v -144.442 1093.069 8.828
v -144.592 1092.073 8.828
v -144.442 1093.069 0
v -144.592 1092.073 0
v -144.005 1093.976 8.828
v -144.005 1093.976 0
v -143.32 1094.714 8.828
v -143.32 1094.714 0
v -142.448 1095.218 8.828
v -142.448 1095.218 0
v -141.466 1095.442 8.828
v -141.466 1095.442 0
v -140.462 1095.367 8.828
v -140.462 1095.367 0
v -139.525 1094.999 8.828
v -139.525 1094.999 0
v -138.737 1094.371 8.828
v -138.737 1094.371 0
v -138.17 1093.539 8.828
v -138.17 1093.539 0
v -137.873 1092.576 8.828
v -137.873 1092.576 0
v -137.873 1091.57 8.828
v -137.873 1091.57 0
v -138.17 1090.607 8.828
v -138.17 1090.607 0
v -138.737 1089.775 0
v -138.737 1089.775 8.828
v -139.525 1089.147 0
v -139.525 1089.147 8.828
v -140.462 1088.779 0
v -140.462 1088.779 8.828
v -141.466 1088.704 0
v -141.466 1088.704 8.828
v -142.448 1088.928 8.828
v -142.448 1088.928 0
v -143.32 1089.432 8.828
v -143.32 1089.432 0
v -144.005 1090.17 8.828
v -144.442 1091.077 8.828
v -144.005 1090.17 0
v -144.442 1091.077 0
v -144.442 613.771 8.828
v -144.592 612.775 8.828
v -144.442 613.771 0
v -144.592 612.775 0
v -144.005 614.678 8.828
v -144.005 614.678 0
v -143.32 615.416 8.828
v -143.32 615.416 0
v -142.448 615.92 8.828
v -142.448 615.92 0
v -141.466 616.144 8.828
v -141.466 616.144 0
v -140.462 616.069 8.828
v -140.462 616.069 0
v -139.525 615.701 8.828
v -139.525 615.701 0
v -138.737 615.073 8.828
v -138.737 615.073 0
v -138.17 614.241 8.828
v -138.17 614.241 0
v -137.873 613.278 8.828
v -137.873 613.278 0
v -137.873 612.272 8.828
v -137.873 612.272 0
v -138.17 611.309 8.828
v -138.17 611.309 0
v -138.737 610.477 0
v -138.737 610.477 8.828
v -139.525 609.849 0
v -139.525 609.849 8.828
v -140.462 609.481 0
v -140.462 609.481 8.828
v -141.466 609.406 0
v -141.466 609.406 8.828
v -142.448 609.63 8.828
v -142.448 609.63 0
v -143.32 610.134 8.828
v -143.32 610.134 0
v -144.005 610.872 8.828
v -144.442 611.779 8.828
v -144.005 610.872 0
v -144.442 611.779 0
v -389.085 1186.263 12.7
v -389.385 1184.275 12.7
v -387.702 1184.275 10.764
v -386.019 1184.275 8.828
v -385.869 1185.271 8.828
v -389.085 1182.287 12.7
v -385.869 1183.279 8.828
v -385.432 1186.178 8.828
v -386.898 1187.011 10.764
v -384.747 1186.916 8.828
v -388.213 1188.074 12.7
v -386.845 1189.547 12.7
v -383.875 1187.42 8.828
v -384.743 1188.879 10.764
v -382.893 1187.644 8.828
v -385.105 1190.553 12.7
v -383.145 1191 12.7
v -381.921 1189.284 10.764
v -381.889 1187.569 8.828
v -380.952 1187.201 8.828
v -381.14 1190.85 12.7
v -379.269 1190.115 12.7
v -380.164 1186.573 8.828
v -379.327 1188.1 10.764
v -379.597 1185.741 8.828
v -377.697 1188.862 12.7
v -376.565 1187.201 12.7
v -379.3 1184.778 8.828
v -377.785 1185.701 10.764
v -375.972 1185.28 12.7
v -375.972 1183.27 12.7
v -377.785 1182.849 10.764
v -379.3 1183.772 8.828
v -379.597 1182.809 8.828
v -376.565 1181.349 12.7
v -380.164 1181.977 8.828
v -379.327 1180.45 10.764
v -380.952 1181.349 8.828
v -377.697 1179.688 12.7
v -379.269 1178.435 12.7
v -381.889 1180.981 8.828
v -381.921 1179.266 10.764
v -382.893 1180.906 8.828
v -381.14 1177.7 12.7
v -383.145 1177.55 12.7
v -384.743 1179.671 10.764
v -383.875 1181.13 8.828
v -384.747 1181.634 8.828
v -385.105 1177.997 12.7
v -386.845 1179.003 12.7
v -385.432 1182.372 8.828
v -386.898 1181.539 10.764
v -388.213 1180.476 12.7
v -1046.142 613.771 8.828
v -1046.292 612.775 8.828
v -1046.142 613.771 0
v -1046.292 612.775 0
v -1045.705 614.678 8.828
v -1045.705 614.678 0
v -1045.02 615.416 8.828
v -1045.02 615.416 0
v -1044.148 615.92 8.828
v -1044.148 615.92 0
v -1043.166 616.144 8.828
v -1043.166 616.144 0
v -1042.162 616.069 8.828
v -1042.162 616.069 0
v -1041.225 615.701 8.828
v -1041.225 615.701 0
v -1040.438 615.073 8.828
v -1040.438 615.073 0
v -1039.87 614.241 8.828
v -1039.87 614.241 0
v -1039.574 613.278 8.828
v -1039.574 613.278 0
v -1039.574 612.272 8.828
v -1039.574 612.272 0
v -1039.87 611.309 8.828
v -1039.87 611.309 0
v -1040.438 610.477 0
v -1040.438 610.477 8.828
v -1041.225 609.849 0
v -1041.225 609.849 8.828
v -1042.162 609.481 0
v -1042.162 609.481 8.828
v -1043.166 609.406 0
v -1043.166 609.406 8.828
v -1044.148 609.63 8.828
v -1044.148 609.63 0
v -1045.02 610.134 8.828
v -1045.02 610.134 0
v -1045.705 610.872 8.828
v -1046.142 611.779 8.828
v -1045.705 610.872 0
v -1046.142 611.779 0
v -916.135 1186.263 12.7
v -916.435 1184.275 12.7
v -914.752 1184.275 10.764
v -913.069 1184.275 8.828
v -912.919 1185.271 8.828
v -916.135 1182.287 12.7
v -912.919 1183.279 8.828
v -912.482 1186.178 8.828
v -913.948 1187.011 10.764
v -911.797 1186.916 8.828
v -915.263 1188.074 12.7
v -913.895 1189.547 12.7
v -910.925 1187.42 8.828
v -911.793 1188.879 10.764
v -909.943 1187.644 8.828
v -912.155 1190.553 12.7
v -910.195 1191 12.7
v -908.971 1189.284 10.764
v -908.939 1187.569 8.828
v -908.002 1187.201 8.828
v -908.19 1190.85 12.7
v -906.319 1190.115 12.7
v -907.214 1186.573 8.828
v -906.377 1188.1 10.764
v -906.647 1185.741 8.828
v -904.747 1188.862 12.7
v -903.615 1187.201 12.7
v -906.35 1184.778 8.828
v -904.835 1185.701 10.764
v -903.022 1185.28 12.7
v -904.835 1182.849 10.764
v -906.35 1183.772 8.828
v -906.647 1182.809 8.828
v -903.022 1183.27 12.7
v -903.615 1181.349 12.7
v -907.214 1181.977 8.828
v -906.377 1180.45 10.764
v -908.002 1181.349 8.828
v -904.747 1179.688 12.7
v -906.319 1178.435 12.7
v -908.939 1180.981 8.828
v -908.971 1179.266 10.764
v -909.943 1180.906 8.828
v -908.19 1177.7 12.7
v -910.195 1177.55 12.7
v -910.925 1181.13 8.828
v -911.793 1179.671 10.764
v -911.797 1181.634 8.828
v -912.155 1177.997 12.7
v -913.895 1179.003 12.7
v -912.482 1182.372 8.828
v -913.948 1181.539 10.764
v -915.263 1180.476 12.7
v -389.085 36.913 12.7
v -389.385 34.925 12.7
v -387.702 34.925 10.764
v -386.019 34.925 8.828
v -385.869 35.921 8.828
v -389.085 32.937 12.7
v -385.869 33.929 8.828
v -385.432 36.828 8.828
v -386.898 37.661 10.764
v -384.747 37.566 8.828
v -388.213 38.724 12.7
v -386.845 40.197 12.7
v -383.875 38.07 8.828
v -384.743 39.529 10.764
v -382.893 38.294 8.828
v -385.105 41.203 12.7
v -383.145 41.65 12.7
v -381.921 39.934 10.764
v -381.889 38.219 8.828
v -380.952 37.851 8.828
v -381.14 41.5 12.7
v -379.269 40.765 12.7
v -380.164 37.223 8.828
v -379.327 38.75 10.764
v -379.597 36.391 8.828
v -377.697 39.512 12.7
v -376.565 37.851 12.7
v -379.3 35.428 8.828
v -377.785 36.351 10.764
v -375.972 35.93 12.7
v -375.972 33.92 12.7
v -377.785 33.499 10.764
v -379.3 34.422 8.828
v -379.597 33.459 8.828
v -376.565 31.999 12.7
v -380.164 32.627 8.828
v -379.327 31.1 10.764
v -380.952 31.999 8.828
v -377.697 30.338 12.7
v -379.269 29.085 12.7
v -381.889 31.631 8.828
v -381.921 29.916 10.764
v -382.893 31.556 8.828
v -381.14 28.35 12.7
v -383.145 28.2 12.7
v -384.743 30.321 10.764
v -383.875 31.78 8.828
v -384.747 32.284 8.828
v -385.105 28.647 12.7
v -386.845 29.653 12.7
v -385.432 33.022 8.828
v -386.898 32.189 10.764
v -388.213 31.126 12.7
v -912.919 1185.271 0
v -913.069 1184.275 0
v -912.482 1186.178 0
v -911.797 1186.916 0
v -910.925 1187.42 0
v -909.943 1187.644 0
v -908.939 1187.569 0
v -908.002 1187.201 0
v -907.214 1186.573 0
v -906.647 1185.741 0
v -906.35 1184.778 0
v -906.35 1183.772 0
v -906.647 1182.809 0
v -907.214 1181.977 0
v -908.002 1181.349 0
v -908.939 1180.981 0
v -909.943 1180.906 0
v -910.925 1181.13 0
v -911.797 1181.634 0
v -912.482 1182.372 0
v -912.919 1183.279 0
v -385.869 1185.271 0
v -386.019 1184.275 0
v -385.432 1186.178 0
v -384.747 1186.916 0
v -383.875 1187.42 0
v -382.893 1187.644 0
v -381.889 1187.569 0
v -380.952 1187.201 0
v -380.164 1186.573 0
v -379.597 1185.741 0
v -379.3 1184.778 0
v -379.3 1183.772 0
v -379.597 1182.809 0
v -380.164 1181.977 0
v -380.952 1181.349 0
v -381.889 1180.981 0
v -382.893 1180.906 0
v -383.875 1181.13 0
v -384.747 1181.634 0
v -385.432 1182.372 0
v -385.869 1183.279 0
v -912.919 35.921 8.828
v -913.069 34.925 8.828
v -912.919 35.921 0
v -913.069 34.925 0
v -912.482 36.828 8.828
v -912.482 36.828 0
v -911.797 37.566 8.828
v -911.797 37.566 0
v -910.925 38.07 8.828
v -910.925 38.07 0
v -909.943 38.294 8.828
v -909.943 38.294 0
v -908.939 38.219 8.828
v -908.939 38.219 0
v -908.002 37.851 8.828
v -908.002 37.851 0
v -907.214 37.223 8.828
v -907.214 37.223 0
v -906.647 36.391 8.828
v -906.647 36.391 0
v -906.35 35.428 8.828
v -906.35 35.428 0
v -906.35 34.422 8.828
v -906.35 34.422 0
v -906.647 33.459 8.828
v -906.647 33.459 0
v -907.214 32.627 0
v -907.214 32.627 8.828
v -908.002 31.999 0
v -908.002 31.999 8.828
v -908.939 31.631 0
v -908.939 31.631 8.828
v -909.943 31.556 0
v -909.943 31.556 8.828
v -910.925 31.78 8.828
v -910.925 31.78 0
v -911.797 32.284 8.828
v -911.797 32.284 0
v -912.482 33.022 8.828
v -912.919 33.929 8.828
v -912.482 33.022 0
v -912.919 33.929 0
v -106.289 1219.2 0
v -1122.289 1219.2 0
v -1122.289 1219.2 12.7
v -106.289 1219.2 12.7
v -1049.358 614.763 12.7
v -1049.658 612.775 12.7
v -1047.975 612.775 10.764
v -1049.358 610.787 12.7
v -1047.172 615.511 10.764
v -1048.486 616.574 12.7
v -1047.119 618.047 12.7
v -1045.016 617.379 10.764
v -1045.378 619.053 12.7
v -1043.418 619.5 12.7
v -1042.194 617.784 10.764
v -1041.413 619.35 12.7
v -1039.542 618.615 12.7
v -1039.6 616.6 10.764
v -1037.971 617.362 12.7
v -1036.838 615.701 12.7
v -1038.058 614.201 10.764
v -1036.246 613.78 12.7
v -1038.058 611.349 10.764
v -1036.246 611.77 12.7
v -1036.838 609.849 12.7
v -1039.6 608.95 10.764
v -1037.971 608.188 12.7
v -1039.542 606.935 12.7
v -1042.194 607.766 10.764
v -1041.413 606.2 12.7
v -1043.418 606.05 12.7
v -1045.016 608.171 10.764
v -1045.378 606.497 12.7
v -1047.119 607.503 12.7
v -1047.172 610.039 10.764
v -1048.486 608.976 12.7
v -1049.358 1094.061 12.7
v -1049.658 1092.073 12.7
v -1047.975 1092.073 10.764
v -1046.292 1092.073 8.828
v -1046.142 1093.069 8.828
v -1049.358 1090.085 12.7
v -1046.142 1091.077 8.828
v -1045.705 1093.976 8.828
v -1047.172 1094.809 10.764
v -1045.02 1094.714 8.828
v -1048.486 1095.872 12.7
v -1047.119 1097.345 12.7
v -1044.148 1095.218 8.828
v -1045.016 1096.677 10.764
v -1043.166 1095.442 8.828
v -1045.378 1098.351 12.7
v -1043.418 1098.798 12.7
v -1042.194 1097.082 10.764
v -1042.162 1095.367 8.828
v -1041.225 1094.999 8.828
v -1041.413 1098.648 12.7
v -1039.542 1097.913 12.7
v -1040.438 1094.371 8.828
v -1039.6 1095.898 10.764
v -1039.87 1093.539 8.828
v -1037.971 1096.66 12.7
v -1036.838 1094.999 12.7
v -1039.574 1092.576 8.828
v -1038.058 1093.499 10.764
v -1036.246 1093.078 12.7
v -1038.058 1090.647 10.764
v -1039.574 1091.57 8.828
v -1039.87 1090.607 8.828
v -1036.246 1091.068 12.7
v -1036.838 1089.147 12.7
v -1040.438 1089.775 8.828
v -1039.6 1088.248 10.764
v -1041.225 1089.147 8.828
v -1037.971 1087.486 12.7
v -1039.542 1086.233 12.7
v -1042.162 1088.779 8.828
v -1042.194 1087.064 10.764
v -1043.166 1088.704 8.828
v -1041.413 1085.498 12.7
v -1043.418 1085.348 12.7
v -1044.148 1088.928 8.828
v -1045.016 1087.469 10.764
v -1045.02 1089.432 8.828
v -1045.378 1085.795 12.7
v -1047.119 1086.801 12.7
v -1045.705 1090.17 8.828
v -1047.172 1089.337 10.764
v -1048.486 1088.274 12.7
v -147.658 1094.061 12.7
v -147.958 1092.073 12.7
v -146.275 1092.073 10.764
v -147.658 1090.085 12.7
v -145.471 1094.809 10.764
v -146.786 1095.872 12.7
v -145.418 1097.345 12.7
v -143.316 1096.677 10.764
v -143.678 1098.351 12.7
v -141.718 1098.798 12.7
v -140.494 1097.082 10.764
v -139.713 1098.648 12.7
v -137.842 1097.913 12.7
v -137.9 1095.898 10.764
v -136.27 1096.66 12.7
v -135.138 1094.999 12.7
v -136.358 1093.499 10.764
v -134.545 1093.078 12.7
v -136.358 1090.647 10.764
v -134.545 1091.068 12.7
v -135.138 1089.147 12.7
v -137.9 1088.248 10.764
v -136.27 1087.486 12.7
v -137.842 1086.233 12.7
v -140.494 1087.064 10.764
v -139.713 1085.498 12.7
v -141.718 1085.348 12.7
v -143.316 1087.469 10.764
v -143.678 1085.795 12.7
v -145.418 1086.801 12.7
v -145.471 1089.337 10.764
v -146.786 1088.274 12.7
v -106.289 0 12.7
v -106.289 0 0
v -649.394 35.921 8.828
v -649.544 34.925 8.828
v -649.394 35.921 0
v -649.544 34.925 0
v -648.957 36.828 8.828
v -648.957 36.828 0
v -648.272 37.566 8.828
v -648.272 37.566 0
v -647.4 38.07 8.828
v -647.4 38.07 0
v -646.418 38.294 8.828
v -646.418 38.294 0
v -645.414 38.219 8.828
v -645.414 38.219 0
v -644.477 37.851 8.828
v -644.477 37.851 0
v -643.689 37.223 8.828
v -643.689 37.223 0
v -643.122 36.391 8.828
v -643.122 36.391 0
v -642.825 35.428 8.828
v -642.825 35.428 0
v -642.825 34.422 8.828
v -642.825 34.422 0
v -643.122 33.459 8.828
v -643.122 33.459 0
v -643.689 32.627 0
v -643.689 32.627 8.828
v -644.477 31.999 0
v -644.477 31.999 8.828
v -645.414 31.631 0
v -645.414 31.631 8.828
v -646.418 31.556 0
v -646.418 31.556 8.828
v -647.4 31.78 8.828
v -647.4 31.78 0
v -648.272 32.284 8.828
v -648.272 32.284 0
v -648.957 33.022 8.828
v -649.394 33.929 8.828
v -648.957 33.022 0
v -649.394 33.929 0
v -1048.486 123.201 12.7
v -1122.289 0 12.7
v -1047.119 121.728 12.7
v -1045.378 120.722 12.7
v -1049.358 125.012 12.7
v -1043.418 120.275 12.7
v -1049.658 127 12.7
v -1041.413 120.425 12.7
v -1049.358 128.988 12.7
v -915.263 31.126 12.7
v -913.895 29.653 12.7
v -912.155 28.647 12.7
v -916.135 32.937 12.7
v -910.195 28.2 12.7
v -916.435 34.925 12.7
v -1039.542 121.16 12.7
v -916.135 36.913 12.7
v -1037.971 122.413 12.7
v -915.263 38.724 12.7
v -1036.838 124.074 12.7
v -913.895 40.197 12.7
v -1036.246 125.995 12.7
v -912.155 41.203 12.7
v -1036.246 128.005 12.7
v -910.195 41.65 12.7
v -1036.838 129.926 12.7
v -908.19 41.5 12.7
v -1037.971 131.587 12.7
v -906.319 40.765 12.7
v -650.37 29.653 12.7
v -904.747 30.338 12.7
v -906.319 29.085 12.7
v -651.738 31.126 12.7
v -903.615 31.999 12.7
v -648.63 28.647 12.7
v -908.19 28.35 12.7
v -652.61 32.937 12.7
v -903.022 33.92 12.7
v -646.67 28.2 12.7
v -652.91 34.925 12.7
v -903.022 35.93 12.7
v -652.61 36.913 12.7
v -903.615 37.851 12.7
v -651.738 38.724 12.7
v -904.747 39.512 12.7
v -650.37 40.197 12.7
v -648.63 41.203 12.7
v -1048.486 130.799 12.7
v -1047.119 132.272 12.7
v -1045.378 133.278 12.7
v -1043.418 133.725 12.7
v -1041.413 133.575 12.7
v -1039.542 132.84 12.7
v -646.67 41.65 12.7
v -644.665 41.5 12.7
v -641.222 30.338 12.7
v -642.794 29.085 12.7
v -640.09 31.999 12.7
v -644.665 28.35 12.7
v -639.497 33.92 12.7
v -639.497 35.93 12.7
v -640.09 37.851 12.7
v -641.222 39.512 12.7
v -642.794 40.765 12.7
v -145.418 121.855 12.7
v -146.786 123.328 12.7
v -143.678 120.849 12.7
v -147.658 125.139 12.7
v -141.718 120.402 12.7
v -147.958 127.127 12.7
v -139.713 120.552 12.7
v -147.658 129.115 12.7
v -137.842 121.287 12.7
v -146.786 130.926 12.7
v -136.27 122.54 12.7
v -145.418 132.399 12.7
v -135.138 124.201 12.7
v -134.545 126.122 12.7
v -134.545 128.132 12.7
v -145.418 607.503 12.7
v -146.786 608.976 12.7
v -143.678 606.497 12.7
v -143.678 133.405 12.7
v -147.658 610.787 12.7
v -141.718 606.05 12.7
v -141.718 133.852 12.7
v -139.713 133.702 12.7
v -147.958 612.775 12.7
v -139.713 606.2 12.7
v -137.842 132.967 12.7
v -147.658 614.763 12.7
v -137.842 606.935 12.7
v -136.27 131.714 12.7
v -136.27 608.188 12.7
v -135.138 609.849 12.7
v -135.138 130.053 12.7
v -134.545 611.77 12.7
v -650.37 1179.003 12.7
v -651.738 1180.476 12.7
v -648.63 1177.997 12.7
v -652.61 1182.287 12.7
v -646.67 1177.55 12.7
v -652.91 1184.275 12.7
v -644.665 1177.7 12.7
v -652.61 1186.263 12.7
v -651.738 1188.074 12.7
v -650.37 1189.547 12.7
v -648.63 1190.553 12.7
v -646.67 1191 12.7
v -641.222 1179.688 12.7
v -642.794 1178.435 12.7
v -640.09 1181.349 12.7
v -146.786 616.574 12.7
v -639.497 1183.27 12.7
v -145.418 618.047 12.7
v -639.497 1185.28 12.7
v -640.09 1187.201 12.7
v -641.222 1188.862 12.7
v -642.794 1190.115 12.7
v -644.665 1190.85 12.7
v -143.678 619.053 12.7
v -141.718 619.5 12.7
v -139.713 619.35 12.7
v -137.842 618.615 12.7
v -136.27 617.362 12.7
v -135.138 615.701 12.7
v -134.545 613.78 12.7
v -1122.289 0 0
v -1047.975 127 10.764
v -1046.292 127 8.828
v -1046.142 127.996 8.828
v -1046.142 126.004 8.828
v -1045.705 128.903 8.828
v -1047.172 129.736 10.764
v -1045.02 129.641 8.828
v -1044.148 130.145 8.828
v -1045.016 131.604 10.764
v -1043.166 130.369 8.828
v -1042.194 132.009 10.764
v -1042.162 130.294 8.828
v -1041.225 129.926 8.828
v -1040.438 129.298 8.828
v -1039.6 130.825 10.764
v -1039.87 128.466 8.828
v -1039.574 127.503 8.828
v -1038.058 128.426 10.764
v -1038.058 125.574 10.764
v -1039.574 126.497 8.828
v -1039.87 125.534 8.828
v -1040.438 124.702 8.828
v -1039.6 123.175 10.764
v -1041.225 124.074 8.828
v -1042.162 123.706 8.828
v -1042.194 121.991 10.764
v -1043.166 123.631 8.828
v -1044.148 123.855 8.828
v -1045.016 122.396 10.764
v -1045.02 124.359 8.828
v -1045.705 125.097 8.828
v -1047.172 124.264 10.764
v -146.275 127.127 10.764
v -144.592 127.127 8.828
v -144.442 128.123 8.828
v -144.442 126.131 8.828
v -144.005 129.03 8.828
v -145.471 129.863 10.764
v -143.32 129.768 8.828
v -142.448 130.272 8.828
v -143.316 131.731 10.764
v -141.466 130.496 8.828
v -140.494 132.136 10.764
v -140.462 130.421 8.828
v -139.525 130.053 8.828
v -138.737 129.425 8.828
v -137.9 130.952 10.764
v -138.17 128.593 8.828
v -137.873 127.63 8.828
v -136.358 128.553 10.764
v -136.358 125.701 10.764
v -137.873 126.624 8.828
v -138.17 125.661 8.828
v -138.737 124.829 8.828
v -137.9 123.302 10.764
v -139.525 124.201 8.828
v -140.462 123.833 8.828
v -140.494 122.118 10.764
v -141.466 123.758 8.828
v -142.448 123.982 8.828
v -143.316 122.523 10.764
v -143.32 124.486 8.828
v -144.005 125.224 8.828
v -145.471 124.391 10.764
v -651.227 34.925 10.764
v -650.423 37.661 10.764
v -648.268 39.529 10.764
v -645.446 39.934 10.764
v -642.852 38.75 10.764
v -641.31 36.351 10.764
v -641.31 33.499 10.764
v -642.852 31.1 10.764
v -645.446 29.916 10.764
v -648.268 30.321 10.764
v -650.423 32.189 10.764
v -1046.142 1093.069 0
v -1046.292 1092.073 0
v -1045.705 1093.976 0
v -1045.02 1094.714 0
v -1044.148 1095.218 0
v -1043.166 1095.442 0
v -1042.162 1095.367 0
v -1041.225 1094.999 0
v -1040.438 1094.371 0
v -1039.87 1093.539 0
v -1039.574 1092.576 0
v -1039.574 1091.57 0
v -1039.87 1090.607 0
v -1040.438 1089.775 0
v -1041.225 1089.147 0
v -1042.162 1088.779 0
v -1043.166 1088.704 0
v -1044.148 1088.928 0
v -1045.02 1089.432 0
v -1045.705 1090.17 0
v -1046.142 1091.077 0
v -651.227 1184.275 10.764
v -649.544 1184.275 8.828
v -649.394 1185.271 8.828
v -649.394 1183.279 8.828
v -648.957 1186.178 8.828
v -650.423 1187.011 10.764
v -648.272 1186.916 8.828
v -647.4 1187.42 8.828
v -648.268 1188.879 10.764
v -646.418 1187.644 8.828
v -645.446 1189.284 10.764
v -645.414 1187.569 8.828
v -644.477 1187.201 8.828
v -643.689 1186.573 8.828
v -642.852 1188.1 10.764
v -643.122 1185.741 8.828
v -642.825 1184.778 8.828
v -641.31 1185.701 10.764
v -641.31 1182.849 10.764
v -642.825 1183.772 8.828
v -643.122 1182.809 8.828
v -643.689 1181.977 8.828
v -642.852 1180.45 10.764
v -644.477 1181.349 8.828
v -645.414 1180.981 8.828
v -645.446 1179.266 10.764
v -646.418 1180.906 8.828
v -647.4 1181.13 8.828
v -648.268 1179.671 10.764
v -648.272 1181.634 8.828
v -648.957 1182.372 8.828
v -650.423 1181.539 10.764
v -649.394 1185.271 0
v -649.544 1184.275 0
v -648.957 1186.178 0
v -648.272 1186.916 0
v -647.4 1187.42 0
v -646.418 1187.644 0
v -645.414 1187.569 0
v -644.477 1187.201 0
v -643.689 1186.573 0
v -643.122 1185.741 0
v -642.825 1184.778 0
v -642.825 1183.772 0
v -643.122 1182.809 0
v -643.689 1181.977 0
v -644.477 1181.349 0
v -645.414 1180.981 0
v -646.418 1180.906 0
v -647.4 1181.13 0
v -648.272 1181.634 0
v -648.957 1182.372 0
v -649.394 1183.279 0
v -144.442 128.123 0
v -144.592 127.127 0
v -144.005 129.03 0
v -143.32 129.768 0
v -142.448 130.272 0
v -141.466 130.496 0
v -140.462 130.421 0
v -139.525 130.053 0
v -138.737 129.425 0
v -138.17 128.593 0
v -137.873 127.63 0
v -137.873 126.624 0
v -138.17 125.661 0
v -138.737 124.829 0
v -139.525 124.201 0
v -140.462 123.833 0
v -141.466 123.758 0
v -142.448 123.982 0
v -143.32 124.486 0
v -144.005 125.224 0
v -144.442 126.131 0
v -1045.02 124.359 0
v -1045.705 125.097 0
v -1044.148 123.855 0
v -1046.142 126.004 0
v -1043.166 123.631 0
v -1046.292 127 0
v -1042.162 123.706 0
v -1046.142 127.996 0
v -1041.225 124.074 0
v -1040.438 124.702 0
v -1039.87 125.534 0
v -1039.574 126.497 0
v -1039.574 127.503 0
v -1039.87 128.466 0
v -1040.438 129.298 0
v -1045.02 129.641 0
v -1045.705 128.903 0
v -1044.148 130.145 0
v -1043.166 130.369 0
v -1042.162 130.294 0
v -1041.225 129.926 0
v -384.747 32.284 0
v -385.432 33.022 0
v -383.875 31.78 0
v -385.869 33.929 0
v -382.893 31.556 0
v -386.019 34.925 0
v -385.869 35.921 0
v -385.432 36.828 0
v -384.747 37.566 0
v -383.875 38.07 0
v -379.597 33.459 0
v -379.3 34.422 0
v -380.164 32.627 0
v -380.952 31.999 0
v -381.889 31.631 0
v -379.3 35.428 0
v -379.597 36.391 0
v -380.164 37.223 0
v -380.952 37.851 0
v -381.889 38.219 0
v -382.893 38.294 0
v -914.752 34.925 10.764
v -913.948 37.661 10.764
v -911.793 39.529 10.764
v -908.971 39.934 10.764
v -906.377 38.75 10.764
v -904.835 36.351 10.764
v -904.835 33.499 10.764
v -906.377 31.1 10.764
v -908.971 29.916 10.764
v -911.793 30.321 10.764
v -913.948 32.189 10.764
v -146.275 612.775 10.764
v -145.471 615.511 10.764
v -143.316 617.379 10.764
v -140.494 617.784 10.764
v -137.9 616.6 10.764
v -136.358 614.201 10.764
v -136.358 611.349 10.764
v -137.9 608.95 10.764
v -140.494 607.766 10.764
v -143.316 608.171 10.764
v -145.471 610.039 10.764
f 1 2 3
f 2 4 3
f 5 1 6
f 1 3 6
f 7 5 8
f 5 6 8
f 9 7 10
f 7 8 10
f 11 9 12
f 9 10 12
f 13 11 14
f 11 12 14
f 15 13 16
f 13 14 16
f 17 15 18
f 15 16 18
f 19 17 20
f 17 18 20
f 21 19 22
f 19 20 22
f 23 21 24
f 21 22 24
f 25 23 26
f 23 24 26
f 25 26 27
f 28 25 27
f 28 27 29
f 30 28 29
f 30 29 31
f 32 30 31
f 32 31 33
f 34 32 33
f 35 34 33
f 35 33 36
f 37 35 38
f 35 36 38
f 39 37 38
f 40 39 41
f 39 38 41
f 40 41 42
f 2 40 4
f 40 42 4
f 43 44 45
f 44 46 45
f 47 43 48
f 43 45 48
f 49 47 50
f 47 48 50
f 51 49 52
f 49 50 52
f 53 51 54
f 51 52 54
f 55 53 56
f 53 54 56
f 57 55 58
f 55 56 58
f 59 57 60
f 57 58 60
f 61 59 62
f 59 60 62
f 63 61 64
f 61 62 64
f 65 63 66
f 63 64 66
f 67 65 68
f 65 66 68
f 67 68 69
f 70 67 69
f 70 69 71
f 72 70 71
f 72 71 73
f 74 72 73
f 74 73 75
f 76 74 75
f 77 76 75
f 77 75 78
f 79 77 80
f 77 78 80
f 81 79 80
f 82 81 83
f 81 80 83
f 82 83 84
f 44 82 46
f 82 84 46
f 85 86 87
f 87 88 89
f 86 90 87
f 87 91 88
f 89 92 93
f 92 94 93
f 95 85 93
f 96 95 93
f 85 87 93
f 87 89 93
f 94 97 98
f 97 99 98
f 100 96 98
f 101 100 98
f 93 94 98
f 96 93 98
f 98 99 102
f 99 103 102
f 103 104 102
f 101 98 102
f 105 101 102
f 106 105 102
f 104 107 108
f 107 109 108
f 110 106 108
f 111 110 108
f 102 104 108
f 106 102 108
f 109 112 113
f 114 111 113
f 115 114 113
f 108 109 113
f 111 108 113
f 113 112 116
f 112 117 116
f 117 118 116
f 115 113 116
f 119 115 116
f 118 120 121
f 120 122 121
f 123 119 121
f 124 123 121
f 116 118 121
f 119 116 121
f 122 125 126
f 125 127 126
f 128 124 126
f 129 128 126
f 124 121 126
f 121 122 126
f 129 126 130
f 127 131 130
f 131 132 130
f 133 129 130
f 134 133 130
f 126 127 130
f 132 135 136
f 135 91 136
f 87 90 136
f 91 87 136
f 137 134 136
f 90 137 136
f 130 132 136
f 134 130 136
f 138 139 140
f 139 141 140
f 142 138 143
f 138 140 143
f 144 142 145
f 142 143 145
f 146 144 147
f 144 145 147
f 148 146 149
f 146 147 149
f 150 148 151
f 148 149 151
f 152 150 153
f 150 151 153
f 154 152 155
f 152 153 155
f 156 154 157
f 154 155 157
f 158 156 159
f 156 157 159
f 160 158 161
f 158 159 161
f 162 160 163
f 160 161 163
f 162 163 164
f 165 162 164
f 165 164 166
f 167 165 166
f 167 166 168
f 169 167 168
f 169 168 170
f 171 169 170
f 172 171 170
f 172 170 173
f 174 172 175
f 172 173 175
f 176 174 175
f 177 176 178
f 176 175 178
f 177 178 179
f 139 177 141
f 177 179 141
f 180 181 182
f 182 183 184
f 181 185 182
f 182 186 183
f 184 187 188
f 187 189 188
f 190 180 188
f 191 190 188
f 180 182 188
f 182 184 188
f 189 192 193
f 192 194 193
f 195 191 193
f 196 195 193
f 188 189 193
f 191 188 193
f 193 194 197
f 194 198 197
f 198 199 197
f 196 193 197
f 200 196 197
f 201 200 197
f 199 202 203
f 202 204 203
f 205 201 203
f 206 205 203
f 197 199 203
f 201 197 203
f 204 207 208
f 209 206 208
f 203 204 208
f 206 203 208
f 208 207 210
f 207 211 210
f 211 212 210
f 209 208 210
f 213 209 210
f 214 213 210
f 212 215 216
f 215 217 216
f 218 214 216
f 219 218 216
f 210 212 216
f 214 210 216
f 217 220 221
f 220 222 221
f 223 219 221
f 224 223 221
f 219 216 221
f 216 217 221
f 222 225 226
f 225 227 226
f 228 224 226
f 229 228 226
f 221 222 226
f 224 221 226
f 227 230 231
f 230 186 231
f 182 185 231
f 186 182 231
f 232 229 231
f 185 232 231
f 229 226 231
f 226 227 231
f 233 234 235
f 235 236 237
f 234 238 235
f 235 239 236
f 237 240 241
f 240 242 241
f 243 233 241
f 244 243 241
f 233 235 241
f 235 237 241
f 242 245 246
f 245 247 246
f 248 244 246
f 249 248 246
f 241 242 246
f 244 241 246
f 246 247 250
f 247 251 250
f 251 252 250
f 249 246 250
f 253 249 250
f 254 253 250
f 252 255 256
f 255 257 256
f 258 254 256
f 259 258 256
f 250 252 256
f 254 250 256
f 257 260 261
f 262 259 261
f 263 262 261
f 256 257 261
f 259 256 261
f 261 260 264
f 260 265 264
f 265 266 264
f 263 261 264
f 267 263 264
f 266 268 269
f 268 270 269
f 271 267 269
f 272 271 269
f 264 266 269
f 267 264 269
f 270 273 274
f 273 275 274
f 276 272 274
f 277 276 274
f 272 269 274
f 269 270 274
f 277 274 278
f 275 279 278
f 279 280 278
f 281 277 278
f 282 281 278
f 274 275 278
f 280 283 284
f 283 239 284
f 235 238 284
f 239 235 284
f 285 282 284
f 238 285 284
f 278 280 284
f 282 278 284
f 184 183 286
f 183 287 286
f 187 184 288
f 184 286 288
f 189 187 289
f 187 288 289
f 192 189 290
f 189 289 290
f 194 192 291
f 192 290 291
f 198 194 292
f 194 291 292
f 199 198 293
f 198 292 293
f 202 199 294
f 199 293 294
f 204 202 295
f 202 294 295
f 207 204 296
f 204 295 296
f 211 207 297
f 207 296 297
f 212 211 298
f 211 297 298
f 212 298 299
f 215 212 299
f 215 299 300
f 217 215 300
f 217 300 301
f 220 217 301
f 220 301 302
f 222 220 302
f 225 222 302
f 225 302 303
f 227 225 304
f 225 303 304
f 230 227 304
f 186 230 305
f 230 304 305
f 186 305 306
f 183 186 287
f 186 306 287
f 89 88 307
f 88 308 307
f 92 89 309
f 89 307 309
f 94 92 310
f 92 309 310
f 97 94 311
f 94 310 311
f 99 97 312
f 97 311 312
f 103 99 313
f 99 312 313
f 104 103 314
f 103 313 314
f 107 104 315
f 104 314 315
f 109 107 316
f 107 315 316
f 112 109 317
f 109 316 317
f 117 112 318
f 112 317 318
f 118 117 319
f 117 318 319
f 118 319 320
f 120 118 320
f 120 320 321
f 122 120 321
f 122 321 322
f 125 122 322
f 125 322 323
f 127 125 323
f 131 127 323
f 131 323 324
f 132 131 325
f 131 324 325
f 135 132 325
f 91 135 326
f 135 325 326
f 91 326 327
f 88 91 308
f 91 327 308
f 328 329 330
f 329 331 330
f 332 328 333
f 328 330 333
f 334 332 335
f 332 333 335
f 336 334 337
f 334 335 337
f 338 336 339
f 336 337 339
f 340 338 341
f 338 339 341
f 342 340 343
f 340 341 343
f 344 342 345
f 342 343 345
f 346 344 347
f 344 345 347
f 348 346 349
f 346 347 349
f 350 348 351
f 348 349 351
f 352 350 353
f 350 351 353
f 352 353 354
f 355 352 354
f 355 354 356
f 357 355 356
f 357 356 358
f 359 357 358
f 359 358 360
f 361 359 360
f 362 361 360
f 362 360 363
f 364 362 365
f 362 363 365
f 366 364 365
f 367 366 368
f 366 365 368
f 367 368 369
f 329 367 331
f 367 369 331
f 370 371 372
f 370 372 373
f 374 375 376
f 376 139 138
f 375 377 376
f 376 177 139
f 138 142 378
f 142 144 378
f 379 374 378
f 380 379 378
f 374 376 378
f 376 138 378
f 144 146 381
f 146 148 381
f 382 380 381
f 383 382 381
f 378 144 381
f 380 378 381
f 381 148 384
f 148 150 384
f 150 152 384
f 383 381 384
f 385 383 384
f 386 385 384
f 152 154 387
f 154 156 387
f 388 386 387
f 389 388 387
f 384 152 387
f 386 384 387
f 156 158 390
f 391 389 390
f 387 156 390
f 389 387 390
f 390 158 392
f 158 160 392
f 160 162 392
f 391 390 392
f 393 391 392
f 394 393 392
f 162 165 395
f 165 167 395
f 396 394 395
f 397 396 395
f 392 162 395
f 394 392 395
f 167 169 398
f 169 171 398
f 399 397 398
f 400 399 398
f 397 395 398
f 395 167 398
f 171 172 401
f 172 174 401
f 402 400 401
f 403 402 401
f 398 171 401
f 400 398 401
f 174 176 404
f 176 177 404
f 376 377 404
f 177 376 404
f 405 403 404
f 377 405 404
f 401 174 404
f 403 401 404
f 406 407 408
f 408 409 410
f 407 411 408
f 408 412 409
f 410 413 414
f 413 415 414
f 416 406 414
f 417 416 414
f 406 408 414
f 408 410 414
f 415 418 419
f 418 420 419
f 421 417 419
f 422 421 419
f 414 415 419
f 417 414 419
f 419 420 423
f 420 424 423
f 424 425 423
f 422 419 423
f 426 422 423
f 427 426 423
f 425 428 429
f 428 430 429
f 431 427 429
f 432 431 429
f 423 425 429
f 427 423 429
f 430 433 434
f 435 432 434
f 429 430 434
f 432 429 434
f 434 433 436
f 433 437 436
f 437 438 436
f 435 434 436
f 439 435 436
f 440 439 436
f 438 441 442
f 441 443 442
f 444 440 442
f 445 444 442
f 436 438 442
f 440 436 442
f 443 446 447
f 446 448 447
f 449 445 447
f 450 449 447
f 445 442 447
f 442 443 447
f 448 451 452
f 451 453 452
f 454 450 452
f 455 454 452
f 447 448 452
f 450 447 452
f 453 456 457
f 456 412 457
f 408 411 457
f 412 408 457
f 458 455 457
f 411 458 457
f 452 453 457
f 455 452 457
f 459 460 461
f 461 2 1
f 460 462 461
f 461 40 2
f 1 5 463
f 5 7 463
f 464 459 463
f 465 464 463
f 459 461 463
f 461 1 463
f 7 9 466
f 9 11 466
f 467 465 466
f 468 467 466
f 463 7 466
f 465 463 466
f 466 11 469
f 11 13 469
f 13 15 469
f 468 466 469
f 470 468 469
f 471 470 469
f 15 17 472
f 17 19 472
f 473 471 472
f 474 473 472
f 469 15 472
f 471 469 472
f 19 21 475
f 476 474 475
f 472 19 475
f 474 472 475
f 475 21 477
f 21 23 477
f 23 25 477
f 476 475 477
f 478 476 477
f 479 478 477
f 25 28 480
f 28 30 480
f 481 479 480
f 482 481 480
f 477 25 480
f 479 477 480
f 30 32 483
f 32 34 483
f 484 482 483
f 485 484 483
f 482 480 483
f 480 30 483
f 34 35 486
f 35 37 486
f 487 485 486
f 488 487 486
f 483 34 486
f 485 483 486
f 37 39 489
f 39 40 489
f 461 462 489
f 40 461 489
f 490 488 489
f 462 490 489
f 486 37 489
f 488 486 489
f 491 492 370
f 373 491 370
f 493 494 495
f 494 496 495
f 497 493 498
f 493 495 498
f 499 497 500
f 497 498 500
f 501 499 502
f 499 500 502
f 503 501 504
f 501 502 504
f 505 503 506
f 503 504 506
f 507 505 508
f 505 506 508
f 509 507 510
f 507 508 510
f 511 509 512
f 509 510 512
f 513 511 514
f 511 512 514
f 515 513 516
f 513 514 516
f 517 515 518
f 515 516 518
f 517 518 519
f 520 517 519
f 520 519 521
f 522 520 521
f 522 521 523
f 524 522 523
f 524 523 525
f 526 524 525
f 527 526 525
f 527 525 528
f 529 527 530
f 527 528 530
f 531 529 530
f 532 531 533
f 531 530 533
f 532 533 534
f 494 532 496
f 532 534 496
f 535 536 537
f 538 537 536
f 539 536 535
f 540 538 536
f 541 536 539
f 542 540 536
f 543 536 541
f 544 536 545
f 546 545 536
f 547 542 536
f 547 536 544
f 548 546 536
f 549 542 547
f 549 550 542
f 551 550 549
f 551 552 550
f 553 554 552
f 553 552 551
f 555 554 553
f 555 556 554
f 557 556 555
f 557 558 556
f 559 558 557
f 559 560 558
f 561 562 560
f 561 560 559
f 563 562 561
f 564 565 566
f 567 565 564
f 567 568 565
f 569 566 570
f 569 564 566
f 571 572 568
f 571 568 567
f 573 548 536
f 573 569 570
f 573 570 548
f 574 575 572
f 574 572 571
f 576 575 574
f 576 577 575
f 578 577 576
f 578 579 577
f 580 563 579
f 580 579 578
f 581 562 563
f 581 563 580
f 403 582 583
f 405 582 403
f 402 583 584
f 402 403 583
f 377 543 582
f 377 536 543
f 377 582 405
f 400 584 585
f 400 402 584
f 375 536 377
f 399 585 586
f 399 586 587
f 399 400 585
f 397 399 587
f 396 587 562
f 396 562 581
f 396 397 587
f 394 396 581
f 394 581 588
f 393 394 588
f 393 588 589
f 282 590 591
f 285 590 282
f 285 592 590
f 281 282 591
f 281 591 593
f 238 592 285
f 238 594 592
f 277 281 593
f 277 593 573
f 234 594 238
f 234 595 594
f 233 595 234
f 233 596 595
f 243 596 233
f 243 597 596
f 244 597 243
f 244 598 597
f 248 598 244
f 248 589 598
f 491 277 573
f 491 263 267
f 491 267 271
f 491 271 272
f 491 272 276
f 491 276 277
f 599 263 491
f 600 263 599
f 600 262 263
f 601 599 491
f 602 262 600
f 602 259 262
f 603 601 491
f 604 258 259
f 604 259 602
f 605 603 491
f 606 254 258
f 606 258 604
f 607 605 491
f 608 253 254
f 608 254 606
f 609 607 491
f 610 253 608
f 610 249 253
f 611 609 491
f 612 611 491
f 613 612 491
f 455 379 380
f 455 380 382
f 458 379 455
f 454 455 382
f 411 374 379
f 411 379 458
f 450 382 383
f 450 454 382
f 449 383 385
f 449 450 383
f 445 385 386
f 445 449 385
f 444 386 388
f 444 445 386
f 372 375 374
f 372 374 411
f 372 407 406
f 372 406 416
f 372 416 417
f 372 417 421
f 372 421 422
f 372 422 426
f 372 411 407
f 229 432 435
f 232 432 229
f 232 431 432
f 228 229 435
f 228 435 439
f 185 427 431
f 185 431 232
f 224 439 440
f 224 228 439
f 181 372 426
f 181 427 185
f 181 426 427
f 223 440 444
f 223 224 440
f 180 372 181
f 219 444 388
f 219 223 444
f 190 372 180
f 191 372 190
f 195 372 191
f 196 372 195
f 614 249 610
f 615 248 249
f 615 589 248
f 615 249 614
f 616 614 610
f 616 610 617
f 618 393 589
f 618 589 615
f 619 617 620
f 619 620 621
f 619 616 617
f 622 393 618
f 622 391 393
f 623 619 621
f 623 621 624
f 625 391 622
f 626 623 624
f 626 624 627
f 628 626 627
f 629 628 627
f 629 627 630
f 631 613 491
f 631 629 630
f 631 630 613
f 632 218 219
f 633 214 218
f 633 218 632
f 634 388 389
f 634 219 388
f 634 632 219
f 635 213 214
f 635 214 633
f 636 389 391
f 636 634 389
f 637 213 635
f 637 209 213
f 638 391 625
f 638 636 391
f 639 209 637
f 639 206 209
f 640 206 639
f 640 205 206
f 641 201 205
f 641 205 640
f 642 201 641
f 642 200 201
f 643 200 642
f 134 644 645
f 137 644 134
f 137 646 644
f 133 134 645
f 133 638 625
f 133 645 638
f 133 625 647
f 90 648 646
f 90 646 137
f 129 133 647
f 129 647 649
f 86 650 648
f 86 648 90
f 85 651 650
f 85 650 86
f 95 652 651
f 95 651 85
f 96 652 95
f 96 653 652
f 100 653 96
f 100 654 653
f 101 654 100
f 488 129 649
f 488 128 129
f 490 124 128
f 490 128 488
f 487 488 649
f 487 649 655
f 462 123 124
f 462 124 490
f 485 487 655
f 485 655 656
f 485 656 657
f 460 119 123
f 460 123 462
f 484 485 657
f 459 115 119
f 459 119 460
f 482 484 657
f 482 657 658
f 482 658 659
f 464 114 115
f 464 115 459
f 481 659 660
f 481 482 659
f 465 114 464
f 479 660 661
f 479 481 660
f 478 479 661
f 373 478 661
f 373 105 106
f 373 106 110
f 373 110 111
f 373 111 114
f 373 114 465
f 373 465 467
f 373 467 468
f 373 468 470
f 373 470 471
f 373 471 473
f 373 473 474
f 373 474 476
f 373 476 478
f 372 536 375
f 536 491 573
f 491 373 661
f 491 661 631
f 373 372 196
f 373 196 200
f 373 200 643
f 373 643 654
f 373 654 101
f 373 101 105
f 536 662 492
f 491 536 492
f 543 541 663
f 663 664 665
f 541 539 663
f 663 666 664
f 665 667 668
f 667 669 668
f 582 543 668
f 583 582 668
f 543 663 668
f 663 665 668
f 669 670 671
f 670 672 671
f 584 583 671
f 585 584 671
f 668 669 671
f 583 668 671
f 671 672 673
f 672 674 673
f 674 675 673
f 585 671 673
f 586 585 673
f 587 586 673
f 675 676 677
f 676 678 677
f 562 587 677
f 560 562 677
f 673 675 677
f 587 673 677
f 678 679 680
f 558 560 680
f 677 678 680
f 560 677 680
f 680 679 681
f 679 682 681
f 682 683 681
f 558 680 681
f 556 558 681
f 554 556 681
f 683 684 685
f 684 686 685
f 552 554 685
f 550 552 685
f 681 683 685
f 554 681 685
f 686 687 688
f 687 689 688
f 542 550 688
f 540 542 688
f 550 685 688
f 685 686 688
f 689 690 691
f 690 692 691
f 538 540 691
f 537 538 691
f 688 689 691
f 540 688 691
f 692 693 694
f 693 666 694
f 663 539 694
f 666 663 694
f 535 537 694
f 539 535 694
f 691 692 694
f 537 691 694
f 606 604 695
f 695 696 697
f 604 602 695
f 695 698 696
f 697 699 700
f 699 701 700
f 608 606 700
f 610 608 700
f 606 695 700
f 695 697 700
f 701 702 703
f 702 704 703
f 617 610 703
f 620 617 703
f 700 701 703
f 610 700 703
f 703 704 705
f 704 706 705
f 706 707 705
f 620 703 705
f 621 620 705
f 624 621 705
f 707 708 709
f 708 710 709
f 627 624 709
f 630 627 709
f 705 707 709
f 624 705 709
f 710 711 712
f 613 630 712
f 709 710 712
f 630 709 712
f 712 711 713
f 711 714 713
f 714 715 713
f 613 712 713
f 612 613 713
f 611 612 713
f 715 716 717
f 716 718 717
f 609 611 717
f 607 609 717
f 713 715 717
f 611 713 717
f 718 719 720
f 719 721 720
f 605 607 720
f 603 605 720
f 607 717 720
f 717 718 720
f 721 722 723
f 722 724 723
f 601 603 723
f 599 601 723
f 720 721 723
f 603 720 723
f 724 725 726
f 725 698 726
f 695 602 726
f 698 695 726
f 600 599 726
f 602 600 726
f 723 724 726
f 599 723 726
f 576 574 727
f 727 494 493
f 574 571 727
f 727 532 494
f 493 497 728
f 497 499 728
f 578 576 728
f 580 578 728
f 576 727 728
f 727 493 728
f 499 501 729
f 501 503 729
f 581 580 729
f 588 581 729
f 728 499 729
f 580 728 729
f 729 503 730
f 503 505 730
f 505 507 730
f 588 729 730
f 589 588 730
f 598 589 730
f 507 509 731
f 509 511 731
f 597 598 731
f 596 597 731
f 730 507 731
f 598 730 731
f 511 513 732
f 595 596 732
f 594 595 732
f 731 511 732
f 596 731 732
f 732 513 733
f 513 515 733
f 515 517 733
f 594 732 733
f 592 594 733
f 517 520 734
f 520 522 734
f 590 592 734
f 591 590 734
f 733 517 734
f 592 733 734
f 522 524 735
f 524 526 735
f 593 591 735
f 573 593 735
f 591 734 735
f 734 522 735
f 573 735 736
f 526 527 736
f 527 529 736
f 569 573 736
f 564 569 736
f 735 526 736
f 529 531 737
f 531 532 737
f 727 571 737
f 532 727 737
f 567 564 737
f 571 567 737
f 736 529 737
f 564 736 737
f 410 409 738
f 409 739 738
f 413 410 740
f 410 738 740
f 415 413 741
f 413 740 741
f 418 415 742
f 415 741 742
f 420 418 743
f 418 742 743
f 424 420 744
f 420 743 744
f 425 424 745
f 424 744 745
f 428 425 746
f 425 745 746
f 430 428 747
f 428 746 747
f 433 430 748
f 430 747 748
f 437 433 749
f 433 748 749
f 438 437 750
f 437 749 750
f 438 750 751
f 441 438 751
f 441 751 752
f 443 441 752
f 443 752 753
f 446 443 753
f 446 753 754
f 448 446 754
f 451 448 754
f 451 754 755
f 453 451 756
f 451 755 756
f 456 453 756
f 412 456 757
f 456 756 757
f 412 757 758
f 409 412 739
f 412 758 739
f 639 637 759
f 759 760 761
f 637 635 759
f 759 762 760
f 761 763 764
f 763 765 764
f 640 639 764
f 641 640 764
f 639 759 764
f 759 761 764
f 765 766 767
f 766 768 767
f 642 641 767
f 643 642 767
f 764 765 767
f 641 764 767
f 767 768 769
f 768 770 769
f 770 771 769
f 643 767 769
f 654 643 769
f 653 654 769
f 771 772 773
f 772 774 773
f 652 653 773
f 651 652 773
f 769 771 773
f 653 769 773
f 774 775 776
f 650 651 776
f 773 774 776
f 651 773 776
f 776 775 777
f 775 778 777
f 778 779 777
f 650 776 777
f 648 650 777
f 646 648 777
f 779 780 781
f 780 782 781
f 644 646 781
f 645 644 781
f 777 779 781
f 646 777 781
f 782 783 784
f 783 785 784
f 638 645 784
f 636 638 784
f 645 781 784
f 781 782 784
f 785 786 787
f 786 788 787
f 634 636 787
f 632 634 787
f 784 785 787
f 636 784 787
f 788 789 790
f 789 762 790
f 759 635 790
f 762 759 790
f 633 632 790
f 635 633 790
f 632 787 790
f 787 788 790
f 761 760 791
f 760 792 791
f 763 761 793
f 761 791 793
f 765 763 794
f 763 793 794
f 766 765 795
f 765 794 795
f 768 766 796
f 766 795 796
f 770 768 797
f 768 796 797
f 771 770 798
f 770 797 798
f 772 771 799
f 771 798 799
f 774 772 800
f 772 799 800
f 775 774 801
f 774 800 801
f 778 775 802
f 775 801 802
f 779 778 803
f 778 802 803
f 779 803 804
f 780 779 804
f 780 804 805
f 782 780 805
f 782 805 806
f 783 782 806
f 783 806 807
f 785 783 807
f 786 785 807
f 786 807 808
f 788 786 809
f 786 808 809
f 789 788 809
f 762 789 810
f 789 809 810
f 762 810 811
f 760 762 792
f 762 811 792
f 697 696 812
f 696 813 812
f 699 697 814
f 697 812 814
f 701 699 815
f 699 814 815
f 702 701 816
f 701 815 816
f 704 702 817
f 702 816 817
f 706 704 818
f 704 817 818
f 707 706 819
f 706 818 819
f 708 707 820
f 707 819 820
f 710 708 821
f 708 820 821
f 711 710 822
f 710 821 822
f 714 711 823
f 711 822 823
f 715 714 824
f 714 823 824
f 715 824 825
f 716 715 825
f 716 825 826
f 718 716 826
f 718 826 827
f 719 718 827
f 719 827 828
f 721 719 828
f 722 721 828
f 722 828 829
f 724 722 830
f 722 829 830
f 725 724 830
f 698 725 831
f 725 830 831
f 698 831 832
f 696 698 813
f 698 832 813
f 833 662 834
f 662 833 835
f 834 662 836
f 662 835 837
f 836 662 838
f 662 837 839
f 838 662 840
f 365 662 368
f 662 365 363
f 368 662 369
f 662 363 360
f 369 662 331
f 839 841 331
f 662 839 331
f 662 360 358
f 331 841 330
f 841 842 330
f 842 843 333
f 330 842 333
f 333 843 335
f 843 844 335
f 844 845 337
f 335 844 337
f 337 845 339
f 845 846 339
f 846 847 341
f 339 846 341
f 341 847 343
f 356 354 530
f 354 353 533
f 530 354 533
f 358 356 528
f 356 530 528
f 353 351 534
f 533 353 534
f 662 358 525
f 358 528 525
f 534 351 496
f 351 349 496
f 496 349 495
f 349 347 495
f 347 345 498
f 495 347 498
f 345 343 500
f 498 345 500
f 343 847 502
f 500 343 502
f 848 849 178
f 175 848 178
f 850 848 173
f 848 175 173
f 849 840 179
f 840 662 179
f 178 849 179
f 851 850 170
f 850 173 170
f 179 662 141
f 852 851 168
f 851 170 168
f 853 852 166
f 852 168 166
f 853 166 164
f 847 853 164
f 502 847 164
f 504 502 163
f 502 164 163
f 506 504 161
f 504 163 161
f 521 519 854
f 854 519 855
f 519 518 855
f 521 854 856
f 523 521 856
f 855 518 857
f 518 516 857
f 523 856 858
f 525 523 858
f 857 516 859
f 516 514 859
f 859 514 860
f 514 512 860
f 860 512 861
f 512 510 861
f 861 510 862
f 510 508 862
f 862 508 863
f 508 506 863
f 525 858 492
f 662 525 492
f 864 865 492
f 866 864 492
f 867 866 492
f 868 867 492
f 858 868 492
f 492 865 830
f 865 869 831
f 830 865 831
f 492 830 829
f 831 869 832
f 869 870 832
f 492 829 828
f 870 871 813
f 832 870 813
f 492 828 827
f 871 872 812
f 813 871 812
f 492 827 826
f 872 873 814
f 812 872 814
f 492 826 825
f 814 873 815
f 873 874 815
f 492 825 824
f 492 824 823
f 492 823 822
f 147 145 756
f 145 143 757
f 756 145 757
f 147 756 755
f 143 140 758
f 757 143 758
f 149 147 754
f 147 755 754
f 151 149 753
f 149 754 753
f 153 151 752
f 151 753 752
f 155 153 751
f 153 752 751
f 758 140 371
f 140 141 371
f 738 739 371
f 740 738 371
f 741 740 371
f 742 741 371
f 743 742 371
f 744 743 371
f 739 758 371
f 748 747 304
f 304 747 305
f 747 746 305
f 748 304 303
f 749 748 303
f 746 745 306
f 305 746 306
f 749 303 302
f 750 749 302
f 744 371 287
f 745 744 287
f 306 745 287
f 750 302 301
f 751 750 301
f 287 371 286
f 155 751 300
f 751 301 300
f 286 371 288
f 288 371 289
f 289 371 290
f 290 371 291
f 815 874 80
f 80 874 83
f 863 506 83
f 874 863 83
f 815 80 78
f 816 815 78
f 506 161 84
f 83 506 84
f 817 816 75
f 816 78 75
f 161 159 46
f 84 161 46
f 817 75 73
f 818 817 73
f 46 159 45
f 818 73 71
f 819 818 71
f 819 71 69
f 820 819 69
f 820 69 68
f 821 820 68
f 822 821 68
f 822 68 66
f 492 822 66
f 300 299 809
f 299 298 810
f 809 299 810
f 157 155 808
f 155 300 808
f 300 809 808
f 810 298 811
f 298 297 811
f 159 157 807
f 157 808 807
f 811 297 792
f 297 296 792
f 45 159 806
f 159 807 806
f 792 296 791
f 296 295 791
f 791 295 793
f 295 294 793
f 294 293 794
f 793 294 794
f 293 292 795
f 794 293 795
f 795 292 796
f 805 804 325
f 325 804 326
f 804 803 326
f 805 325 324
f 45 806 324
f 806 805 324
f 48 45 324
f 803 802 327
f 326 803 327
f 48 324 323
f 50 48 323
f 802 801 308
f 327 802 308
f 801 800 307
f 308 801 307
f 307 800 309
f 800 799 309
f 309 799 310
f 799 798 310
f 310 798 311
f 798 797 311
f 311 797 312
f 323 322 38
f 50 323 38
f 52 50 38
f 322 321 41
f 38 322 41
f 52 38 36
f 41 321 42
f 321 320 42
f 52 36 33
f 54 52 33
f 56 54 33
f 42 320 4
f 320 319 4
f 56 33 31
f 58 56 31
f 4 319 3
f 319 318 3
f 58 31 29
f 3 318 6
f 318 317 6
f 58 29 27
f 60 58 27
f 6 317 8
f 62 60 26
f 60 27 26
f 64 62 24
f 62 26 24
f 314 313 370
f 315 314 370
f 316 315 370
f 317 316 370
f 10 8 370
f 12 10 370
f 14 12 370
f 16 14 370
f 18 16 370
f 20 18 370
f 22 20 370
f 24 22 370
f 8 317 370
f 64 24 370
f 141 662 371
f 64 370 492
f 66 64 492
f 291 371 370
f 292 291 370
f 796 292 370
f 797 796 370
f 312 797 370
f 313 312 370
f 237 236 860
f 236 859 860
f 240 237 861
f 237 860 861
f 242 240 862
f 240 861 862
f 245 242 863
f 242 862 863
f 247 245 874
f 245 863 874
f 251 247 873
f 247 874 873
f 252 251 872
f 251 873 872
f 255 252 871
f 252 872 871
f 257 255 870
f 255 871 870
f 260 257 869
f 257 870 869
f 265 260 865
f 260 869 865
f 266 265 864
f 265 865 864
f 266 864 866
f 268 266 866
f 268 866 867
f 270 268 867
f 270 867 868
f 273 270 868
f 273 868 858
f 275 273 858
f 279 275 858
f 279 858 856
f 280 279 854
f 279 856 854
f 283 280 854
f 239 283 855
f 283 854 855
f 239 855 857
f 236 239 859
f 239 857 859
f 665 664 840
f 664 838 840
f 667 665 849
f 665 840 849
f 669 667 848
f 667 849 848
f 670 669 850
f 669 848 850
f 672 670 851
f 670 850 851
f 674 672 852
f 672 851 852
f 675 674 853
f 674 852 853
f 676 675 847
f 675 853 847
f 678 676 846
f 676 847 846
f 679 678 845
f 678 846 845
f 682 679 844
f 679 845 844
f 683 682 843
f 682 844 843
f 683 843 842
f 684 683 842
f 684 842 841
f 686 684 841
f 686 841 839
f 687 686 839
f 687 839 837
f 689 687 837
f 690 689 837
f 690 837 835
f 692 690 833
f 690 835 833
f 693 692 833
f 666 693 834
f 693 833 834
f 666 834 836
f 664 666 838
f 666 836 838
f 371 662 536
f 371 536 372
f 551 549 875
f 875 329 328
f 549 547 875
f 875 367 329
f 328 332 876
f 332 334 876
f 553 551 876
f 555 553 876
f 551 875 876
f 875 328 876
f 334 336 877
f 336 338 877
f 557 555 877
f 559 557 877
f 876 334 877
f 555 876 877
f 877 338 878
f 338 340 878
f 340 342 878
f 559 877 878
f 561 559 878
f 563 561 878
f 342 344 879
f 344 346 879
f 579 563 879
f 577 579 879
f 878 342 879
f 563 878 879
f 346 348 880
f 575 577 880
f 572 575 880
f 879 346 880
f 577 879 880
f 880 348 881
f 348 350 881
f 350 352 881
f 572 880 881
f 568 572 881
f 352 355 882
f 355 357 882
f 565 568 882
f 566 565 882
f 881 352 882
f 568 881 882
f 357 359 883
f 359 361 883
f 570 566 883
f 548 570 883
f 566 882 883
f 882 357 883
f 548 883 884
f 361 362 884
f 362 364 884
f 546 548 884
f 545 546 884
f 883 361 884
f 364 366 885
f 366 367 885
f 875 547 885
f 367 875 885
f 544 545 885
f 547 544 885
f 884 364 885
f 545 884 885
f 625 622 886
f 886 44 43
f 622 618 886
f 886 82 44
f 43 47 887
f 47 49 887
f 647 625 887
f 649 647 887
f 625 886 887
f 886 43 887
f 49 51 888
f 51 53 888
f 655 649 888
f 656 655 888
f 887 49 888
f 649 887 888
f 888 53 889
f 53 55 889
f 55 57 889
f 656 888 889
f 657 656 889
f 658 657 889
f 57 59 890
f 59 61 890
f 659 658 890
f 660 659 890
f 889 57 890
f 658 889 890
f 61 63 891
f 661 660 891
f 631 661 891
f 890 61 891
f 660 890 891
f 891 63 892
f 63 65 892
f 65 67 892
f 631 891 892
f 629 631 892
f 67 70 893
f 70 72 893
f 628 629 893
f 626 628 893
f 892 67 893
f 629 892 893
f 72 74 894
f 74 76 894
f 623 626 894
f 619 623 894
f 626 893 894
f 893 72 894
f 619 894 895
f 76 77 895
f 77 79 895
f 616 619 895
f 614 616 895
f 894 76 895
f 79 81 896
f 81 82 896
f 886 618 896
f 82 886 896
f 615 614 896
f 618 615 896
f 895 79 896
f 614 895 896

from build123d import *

# Parameters (mm, degrees)
SKETCH1_W                                           = 1016
SKETCH1_H                                           = 1219.2
BOSS_EXTRUDE1_DEPTH                                 = 12.7
SKETCH2_R                                           = 3.302
SKETCH2_R_2                                         = 3.175
CUT_EXTRUDE1_DEPTH                                  = 12.7
CSK_FOR_1_4_FLAT_HEAD_SOCKET_CAP_SCREW1_D           = 6.7564
CSK_FOR_1_4_FLAT_HEAD_SOCKET_CAP_SCREW1_CSINK_D     = 13.4874
CSK_FOR_1_4_FLAT_HEAD_SOCKET_CAP_SCREW1_CSINK_ANGLE = 82


with BuildPart() as part:
    # Sketch1 → Boss-Extrude1 (new body)
    with BuildSketch(Plane.XY):
        with Locations((-614.288814817, 609.6)):
            Rectangle(SKETCH1_W, SKETCH1_H)
    extrude(amount=BOSS_EXTRUDE1_DEPTH)

    # Sketch2 → Cut-Extrude1 (cut)
    with BuildSketch(Plane(origin=(0, 0, 0), x_dir=(-1, 0, 0), z_dir=(0, 0, -1))):
        with Locations((382.640814817, 1184.275)):
            Circle(SKETCH2_R)
        with Locations((646.165814817, 1184.275)):
            Circle(SKETCH2_R)
        with Locations((909.690814817, 1184.275)):
            Circle(SKETCH2_R)
        with Locations((1042.914014184, 1092.073)):
            Circle(SKETCH2_R_2)
        with Locations((1042.914014184, 612.775)):
            Circle(SKETCH2_R_2)
        with Locations((1042.914014184, 127)):
            Circle(SKETCH2_R_2)
        with Locations((141.213814817, 127.127)):
            Circle(SKETCH2_R_2)
        with Locations((141.213814817, 612.775)):
            Circle(SKETCH2_R)
        with Locations((141.213814817, 1092.073)):
            Circle(SKETCH2_R_2)
        with Locations((909.690814817, 34.925)):
            Circle(SKETCH2_R)
        with Locations((646.165814817, 34.925)):
            Circle(SKETCH2_R)
        with Locations((382.640814817, 34.925)):
            Circle(SKETCH2_R)
    extrude(amount=-CUT_EXTRUDE1_DEPTH, mode=Mode.SUBTRACT)

    # CSK for 1/4 Flat Head Socket Cap Screw1 (through all)
    with Locations(Plane(origin=(-909.690814817, 1184.275, 12.7), x_dir=(1, 0, 0), z_dir=(0, 0, 1))):
        with Locations((0, 0), (263.525, 0), (527.05, 0), (768.477, -92.202), (768.477, -571.5), (768.477, -1057.148), (527.05, -1149.35), (263.525, -1149.35), (0, -1149.35), (-133.223199367, -1057.275), (-133.223199367, -571.5), (-133.223199367, -92.202)):
            CounterSinkHole(CSK_FOR_1_4_FLAT_HEAD_SOCKET_CAP_SCREW1_D / 2, CSK_FOR_1_4_FLAT_HEAD_SOCKET_CAP_SCREW1_CSINK_D / 2, counter_sink_angle=CSK_FOR_1_4_FLAT_HEAD_SOCKET_CAP_SCREW1_CSINK_ANGLE)


solid = part.part
